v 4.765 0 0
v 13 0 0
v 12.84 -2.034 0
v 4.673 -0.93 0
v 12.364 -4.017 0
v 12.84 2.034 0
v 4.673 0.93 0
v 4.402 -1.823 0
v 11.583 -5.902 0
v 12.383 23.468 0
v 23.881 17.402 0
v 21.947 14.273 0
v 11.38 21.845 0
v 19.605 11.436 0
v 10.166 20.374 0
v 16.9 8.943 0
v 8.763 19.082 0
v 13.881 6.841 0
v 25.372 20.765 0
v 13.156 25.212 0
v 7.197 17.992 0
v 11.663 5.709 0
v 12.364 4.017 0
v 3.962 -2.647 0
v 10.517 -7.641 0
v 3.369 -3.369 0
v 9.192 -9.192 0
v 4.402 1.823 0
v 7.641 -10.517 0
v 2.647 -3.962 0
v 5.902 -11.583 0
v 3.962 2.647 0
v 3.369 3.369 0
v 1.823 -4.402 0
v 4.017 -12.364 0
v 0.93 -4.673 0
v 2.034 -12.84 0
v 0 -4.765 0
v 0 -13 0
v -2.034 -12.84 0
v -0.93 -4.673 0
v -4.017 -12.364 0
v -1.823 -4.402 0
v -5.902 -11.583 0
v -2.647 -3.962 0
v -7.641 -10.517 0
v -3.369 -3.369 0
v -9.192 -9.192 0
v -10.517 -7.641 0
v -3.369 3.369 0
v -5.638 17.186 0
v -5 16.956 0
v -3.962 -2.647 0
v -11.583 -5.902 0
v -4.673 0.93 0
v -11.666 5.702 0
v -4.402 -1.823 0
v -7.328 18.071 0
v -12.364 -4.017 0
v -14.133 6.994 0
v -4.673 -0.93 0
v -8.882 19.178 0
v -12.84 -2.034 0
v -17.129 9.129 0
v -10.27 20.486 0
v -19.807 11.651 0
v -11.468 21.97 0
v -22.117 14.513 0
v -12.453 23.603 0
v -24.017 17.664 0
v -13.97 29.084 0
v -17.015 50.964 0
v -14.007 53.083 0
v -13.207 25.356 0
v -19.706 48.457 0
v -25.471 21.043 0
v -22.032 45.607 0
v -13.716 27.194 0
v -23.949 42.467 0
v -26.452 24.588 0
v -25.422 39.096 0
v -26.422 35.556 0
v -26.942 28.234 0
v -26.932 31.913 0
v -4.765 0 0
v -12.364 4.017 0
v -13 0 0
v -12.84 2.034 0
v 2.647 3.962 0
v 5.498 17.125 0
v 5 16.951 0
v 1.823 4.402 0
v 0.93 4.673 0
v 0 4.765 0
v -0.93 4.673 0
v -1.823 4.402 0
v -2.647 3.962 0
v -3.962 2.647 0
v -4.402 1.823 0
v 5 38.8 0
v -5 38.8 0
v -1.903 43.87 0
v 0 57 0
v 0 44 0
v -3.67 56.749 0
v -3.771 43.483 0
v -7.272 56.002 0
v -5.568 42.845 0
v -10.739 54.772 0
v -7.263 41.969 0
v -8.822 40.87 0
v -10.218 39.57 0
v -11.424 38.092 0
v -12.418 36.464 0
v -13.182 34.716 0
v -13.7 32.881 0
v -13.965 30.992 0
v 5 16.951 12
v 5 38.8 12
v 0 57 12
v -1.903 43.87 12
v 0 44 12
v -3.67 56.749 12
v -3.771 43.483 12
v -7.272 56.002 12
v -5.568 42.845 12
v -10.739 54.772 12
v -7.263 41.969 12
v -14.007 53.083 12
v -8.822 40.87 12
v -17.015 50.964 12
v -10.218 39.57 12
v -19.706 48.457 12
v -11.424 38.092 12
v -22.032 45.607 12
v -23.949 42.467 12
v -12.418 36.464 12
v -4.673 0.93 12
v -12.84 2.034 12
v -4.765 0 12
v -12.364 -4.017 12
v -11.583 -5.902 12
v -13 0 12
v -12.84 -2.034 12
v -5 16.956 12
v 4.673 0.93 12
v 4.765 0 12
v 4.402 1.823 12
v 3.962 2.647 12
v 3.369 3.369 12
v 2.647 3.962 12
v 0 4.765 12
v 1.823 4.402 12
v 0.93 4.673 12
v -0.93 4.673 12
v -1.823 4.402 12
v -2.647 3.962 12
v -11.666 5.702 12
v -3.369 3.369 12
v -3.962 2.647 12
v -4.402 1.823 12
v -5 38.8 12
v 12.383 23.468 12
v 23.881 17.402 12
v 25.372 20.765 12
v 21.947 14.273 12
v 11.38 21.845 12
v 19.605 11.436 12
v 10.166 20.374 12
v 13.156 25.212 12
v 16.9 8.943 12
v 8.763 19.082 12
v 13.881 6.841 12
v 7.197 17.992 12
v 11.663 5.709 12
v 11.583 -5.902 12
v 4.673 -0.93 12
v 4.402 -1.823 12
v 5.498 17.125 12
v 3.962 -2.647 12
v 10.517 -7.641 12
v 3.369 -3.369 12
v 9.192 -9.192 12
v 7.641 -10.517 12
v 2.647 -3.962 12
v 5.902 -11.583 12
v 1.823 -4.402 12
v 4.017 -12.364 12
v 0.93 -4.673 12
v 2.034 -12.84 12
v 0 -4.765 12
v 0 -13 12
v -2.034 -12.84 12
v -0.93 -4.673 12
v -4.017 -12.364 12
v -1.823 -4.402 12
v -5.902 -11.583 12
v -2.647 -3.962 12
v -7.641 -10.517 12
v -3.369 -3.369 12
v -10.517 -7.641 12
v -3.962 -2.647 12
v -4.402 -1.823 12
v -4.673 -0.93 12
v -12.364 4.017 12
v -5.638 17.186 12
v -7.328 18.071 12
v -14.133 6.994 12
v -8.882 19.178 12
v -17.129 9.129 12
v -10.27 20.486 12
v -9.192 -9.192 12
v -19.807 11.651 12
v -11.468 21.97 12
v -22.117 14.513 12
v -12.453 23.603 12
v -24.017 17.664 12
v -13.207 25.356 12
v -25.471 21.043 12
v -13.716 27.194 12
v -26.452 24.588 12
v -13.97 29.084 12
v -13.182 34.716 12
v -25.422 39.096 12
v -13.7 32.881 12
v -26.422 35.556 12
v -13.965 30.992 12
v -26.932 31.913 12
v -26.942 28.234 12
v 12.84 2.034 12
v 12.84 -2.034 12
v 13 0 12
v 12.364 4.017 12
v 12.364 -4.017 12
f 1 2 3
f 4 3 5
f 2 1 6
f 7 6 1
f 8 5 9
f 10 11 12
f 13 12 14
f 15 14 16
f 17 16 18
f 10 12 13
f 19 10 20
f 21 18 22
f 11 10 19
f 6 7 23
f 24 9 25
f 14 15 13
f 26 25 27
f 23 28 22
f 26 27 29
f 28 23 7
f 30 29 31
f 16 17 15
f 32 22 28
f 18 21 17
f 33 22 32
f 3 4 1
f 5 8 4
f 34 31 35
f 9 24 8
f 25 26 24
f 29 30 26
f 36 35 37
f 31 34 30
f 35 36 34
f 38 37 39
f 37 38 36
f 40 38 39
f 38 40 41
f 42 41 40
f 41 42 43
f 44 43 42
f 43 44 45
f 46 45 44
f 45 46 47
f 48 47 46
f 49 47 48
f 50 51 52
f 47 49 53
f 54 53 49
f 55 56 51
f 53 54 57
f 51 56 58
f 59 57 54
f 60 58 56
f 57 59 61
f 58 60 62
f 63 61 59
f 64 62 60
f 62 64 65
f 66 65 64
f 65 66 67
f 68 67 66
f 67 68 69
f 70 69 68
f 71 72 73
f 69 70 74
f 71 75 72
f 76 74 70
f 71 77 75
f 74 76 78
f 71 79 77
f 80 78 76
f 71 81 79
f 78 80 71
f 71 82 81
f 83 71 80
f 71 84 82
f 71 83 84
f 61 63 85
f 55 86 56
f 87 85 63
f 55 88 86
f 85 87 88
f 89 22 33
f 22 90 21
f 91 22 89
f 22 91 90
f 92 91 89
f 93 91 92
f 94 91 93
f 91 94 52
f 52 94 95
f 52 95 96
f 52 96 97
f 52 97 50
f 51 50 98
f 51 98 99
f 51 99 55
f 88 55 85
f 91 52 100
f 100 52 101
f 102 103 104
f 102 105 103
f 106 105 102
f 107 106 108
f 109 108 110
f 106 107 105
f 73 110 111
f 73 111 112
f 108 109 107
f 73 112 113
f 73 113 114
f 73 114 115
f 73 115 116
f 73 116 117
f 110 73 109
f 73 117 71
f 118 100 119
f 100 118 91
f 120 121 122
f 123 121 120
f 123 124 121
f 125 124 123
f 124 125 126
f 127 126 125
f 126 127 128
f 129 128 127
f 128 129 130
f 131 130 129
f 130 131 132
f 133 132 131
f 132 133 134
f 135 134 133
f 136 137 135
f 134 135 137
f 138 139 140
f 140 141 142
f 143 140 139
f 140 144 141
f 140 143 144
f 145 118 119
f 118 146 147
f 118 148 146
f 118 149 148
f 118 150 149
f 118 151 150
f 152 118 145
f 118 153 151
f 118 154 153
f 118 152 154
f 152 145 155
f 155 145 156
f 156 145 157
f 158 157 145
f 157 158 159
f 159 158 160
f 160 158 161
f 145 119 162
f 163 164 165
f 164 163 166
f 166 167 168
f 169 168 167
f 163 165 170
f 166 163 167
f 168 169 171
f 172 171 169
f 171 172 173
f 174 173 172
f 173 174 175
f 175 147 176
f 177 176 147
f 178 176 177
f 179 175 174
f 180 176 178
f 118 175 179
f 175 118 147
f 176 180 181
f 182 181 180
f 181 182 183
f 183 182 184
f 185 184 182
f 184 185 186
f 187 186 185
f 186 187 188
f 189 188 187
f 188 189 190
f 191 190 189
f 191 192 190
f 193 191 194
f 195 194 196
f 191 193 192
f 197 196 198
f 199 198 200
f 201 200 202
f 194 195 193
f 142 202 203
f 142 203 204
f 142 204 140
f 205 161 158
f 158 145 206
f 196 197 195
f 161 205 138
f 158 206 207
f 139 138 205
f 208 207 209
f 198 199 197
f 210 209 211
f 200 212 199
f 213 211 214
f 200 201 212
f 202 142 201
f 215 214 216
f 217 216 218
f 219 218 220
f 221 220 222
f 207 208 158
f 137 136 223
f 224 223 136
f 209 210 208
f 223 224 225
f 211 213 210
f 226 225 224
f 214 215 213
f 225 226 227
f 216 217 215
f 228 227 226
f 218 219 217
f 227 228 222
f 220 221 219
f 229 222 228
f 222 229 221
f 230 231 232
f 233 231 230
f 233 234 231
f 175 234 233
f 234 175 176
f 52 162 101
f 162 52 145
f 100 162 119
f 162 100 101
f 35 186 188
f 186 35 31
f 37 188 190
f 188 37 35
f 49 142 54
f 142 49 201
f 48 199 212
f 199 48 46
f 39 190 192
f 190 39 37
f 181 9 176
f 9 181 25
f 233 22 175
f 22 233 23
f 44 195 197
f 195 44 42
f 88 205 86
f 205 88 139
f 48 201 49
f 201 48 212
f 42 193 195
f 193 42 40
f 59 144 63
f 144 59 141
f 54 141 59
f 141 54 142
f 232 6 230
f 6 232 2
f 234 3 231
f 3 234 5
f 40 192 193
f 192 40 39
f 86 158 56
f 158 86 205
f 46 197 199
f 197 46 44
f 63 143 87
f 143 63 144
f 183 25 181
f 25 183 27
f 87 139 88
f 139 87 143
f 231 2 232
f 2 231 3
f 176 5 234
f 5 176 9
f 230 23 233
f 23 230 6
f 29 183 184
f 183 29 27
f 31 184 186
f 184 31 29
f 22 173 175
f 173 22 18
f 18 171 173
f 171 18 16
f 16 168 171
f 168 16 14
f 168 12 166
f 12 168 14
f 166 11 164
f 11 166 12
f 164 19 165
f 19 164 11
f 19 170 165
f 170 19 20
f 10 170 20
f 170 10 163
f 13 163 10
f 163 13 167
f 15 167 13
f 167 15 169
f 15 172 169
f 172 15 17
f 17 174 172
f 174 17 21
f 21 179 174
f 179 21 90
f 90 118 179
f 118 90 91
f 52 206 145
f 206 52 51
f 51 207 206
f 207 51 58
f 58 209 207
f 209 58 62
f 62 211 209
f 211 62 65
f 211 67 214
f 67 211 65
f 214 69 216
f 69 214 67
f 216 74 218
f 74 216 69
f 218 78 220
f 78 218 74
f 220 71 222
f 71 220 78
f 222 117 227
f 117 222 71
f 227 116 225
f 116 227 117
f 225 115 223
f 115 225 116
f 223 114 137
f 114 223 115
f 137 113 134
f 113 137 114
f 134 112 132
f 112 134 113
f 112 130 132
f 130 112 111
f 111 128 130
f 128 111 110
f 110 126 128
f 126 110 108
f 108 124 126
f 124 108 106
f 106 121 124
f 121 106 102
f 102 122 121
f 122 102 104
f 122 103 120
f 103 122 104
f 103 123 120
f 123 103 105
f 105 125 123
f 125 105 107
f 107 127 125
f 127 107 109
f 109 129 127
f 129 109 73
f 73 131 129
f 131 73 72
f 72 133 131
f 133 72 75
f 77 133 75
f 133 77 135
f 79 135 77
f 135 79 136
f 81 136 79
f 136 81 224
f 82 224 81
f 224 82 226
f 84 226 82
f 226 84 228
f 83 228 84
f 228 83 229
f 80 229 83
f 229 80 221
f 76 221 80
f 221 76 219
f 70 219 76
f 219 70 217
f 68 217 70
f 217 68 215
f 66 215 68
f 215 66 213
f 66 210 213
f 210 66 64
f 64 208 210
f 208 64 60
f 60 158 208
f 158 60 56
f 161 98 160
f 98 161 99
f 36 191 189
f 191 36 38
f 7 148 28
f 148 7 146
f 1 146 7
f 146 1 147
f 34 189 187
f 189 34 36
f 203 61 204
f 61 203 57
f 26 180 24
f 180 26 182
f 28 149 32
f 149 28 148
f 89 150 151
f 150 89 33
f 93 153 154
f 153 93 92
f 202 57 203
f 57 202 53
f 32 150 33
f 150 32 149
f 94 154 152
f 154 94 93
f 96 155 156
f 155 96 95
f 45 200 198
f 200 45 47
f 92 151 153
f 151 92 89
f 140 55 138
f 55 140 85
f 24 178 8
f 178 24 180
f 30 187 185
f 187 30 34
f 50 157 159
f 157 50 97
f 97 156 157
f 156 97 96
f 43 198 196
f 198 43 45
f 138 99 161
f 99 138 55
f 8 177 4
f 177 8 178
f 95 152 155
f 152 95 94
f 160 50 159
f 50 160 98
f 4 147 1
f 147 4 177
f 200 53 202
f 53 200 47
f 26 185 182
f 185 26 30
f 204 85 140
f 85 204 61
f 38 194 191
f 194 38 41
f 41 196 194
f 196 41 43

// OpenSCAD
$fn = 32;

// ----------------------------------------------------------------------
// Hook: 60 mm shank into a 14 mm curl, 12 mm thick
// ----------------------------------------------------------------------

// --- parameters (mm) ---
shank_len = 60;           // shank length from the boss centre
shank_w = 10;             // shank width
boss_d = 26;              // boss diameter
bore_d = 9.53;            // boss bore
curl_in = 14;             // curl inner radius
curl_out = 27;            // curl outer radius
curl_sweep = 250;         // curl sweep angle
hook_t = 12;              // hook thickness

shank_profile = [[-5, 38.8], [5, 38.8], [5, 11], [-5, 11]];
boss_profile = [[13, 0], [12.84, 2.034], [12.364, 4.017], [11.583, 5.902], [10.517, 7.641], [9.192, 9.192], [7.641, 10.517], [5.902, 11.583], [4.017, 12.364], [2.034, 12.84], [0, 13], [-2.034, 12.84], [-4.017, 12.364], [-5.902, 11.583], [-7.641, 10.517], [-9.192, 9.192], [-10.517, 7.641], [-11.583, 5.902], [-12.364, 4.017], [-12.84, 2.034], [-13, 0], [-12.84, -2.034], [-12.364, -4.017], [-11.583, -5.902], [-10.517, -7.641], [-9.192, -9.192], [-7.641, -10.517], [-5.902, -11.583], [-4.017, -12.364], [-2.034, -12.84], [0, -13], [2.034, -12.84], [4.017, -12.364], [5.902, -11.583], [7.641, -10.517], [9.192, -9.192], [10.517, -7.641], [11.583, -5.902], [12.364, -4.017], [12.84, -2.034]];
curl_profile = [[0, 57], [-3.67, 56.749], [-7.272, 56.002], [-10.739, 54.772], [-14.007, 53.083], [-17.015, 50.964], [-19.706, 48.457], [-22.032, 45.607], [-23.949, 42.467], [-25.422, 39.096], [-26.422, 35.556], [-26.932, 31.913], [-26.942, 28.234], [-26.452, 24.588], [-25.471, 21.043], [-24.017, 17.664], [-22.117, 14.513], [-19.807, 11.651], [-17.129, 9.129], [-14.133, 6.994], [-10.874, 5.287], [-7.414, 4.038], [-3.816, 3.271], [-0.147, 3], [3.524, 3.231], [7.13, 3.959], [10.604, 5.169], [13.881, 6.841], [16.9, 8.943], [19.605, 11.436], [21.947, 14.273], [23.881, 17.402], [25.372, 20.765], [13.156, 25.212], [12.383, 23.468], [11.38, 21.845], [10.166, 20.374], [8.763, 19.082], [7.197, 17.992], [5.498, 17.125], [3.697, 16.497], [1.827, 16.12], [-0.076, 16], [-1.979, 16.141], [-3.844, 16.538], [-5.638, 17.186], [-7.328, 18.071], [-8.882, 19.178], [-10.27, 20.486], [-11.468, 21.97], [-12.453, 23.603], [-13.207, 25.356], [-13.716, 27.194], [-13.97, 29.084], [-13.965, 30.992], [-13.7, 32.881], [-13.182, 34.716], [-12.418, 36.464], [-11.424, 38.092], [-10.218, 39.57], [-8.822, 40.87], [-7.263, 41.969], [-5.568, 42.845], [-3.771, 43.483], [-1.903, 43.87], [0, 44]];

difference() {
  union() {
    /* three overlapping outlines: shank, boss and the smooth curl */
    linear_extrude(height = hook_t) polygon(shank_profile);
    linear_extrude(height = hook_t) polygon(boss_profile);
    linear_extrude(height = hook_t) polygon(curl_profile);
  }
  translate([0, 0, -2.5]) cylinder(h = hook_t + 5, d = bore_d);
}
